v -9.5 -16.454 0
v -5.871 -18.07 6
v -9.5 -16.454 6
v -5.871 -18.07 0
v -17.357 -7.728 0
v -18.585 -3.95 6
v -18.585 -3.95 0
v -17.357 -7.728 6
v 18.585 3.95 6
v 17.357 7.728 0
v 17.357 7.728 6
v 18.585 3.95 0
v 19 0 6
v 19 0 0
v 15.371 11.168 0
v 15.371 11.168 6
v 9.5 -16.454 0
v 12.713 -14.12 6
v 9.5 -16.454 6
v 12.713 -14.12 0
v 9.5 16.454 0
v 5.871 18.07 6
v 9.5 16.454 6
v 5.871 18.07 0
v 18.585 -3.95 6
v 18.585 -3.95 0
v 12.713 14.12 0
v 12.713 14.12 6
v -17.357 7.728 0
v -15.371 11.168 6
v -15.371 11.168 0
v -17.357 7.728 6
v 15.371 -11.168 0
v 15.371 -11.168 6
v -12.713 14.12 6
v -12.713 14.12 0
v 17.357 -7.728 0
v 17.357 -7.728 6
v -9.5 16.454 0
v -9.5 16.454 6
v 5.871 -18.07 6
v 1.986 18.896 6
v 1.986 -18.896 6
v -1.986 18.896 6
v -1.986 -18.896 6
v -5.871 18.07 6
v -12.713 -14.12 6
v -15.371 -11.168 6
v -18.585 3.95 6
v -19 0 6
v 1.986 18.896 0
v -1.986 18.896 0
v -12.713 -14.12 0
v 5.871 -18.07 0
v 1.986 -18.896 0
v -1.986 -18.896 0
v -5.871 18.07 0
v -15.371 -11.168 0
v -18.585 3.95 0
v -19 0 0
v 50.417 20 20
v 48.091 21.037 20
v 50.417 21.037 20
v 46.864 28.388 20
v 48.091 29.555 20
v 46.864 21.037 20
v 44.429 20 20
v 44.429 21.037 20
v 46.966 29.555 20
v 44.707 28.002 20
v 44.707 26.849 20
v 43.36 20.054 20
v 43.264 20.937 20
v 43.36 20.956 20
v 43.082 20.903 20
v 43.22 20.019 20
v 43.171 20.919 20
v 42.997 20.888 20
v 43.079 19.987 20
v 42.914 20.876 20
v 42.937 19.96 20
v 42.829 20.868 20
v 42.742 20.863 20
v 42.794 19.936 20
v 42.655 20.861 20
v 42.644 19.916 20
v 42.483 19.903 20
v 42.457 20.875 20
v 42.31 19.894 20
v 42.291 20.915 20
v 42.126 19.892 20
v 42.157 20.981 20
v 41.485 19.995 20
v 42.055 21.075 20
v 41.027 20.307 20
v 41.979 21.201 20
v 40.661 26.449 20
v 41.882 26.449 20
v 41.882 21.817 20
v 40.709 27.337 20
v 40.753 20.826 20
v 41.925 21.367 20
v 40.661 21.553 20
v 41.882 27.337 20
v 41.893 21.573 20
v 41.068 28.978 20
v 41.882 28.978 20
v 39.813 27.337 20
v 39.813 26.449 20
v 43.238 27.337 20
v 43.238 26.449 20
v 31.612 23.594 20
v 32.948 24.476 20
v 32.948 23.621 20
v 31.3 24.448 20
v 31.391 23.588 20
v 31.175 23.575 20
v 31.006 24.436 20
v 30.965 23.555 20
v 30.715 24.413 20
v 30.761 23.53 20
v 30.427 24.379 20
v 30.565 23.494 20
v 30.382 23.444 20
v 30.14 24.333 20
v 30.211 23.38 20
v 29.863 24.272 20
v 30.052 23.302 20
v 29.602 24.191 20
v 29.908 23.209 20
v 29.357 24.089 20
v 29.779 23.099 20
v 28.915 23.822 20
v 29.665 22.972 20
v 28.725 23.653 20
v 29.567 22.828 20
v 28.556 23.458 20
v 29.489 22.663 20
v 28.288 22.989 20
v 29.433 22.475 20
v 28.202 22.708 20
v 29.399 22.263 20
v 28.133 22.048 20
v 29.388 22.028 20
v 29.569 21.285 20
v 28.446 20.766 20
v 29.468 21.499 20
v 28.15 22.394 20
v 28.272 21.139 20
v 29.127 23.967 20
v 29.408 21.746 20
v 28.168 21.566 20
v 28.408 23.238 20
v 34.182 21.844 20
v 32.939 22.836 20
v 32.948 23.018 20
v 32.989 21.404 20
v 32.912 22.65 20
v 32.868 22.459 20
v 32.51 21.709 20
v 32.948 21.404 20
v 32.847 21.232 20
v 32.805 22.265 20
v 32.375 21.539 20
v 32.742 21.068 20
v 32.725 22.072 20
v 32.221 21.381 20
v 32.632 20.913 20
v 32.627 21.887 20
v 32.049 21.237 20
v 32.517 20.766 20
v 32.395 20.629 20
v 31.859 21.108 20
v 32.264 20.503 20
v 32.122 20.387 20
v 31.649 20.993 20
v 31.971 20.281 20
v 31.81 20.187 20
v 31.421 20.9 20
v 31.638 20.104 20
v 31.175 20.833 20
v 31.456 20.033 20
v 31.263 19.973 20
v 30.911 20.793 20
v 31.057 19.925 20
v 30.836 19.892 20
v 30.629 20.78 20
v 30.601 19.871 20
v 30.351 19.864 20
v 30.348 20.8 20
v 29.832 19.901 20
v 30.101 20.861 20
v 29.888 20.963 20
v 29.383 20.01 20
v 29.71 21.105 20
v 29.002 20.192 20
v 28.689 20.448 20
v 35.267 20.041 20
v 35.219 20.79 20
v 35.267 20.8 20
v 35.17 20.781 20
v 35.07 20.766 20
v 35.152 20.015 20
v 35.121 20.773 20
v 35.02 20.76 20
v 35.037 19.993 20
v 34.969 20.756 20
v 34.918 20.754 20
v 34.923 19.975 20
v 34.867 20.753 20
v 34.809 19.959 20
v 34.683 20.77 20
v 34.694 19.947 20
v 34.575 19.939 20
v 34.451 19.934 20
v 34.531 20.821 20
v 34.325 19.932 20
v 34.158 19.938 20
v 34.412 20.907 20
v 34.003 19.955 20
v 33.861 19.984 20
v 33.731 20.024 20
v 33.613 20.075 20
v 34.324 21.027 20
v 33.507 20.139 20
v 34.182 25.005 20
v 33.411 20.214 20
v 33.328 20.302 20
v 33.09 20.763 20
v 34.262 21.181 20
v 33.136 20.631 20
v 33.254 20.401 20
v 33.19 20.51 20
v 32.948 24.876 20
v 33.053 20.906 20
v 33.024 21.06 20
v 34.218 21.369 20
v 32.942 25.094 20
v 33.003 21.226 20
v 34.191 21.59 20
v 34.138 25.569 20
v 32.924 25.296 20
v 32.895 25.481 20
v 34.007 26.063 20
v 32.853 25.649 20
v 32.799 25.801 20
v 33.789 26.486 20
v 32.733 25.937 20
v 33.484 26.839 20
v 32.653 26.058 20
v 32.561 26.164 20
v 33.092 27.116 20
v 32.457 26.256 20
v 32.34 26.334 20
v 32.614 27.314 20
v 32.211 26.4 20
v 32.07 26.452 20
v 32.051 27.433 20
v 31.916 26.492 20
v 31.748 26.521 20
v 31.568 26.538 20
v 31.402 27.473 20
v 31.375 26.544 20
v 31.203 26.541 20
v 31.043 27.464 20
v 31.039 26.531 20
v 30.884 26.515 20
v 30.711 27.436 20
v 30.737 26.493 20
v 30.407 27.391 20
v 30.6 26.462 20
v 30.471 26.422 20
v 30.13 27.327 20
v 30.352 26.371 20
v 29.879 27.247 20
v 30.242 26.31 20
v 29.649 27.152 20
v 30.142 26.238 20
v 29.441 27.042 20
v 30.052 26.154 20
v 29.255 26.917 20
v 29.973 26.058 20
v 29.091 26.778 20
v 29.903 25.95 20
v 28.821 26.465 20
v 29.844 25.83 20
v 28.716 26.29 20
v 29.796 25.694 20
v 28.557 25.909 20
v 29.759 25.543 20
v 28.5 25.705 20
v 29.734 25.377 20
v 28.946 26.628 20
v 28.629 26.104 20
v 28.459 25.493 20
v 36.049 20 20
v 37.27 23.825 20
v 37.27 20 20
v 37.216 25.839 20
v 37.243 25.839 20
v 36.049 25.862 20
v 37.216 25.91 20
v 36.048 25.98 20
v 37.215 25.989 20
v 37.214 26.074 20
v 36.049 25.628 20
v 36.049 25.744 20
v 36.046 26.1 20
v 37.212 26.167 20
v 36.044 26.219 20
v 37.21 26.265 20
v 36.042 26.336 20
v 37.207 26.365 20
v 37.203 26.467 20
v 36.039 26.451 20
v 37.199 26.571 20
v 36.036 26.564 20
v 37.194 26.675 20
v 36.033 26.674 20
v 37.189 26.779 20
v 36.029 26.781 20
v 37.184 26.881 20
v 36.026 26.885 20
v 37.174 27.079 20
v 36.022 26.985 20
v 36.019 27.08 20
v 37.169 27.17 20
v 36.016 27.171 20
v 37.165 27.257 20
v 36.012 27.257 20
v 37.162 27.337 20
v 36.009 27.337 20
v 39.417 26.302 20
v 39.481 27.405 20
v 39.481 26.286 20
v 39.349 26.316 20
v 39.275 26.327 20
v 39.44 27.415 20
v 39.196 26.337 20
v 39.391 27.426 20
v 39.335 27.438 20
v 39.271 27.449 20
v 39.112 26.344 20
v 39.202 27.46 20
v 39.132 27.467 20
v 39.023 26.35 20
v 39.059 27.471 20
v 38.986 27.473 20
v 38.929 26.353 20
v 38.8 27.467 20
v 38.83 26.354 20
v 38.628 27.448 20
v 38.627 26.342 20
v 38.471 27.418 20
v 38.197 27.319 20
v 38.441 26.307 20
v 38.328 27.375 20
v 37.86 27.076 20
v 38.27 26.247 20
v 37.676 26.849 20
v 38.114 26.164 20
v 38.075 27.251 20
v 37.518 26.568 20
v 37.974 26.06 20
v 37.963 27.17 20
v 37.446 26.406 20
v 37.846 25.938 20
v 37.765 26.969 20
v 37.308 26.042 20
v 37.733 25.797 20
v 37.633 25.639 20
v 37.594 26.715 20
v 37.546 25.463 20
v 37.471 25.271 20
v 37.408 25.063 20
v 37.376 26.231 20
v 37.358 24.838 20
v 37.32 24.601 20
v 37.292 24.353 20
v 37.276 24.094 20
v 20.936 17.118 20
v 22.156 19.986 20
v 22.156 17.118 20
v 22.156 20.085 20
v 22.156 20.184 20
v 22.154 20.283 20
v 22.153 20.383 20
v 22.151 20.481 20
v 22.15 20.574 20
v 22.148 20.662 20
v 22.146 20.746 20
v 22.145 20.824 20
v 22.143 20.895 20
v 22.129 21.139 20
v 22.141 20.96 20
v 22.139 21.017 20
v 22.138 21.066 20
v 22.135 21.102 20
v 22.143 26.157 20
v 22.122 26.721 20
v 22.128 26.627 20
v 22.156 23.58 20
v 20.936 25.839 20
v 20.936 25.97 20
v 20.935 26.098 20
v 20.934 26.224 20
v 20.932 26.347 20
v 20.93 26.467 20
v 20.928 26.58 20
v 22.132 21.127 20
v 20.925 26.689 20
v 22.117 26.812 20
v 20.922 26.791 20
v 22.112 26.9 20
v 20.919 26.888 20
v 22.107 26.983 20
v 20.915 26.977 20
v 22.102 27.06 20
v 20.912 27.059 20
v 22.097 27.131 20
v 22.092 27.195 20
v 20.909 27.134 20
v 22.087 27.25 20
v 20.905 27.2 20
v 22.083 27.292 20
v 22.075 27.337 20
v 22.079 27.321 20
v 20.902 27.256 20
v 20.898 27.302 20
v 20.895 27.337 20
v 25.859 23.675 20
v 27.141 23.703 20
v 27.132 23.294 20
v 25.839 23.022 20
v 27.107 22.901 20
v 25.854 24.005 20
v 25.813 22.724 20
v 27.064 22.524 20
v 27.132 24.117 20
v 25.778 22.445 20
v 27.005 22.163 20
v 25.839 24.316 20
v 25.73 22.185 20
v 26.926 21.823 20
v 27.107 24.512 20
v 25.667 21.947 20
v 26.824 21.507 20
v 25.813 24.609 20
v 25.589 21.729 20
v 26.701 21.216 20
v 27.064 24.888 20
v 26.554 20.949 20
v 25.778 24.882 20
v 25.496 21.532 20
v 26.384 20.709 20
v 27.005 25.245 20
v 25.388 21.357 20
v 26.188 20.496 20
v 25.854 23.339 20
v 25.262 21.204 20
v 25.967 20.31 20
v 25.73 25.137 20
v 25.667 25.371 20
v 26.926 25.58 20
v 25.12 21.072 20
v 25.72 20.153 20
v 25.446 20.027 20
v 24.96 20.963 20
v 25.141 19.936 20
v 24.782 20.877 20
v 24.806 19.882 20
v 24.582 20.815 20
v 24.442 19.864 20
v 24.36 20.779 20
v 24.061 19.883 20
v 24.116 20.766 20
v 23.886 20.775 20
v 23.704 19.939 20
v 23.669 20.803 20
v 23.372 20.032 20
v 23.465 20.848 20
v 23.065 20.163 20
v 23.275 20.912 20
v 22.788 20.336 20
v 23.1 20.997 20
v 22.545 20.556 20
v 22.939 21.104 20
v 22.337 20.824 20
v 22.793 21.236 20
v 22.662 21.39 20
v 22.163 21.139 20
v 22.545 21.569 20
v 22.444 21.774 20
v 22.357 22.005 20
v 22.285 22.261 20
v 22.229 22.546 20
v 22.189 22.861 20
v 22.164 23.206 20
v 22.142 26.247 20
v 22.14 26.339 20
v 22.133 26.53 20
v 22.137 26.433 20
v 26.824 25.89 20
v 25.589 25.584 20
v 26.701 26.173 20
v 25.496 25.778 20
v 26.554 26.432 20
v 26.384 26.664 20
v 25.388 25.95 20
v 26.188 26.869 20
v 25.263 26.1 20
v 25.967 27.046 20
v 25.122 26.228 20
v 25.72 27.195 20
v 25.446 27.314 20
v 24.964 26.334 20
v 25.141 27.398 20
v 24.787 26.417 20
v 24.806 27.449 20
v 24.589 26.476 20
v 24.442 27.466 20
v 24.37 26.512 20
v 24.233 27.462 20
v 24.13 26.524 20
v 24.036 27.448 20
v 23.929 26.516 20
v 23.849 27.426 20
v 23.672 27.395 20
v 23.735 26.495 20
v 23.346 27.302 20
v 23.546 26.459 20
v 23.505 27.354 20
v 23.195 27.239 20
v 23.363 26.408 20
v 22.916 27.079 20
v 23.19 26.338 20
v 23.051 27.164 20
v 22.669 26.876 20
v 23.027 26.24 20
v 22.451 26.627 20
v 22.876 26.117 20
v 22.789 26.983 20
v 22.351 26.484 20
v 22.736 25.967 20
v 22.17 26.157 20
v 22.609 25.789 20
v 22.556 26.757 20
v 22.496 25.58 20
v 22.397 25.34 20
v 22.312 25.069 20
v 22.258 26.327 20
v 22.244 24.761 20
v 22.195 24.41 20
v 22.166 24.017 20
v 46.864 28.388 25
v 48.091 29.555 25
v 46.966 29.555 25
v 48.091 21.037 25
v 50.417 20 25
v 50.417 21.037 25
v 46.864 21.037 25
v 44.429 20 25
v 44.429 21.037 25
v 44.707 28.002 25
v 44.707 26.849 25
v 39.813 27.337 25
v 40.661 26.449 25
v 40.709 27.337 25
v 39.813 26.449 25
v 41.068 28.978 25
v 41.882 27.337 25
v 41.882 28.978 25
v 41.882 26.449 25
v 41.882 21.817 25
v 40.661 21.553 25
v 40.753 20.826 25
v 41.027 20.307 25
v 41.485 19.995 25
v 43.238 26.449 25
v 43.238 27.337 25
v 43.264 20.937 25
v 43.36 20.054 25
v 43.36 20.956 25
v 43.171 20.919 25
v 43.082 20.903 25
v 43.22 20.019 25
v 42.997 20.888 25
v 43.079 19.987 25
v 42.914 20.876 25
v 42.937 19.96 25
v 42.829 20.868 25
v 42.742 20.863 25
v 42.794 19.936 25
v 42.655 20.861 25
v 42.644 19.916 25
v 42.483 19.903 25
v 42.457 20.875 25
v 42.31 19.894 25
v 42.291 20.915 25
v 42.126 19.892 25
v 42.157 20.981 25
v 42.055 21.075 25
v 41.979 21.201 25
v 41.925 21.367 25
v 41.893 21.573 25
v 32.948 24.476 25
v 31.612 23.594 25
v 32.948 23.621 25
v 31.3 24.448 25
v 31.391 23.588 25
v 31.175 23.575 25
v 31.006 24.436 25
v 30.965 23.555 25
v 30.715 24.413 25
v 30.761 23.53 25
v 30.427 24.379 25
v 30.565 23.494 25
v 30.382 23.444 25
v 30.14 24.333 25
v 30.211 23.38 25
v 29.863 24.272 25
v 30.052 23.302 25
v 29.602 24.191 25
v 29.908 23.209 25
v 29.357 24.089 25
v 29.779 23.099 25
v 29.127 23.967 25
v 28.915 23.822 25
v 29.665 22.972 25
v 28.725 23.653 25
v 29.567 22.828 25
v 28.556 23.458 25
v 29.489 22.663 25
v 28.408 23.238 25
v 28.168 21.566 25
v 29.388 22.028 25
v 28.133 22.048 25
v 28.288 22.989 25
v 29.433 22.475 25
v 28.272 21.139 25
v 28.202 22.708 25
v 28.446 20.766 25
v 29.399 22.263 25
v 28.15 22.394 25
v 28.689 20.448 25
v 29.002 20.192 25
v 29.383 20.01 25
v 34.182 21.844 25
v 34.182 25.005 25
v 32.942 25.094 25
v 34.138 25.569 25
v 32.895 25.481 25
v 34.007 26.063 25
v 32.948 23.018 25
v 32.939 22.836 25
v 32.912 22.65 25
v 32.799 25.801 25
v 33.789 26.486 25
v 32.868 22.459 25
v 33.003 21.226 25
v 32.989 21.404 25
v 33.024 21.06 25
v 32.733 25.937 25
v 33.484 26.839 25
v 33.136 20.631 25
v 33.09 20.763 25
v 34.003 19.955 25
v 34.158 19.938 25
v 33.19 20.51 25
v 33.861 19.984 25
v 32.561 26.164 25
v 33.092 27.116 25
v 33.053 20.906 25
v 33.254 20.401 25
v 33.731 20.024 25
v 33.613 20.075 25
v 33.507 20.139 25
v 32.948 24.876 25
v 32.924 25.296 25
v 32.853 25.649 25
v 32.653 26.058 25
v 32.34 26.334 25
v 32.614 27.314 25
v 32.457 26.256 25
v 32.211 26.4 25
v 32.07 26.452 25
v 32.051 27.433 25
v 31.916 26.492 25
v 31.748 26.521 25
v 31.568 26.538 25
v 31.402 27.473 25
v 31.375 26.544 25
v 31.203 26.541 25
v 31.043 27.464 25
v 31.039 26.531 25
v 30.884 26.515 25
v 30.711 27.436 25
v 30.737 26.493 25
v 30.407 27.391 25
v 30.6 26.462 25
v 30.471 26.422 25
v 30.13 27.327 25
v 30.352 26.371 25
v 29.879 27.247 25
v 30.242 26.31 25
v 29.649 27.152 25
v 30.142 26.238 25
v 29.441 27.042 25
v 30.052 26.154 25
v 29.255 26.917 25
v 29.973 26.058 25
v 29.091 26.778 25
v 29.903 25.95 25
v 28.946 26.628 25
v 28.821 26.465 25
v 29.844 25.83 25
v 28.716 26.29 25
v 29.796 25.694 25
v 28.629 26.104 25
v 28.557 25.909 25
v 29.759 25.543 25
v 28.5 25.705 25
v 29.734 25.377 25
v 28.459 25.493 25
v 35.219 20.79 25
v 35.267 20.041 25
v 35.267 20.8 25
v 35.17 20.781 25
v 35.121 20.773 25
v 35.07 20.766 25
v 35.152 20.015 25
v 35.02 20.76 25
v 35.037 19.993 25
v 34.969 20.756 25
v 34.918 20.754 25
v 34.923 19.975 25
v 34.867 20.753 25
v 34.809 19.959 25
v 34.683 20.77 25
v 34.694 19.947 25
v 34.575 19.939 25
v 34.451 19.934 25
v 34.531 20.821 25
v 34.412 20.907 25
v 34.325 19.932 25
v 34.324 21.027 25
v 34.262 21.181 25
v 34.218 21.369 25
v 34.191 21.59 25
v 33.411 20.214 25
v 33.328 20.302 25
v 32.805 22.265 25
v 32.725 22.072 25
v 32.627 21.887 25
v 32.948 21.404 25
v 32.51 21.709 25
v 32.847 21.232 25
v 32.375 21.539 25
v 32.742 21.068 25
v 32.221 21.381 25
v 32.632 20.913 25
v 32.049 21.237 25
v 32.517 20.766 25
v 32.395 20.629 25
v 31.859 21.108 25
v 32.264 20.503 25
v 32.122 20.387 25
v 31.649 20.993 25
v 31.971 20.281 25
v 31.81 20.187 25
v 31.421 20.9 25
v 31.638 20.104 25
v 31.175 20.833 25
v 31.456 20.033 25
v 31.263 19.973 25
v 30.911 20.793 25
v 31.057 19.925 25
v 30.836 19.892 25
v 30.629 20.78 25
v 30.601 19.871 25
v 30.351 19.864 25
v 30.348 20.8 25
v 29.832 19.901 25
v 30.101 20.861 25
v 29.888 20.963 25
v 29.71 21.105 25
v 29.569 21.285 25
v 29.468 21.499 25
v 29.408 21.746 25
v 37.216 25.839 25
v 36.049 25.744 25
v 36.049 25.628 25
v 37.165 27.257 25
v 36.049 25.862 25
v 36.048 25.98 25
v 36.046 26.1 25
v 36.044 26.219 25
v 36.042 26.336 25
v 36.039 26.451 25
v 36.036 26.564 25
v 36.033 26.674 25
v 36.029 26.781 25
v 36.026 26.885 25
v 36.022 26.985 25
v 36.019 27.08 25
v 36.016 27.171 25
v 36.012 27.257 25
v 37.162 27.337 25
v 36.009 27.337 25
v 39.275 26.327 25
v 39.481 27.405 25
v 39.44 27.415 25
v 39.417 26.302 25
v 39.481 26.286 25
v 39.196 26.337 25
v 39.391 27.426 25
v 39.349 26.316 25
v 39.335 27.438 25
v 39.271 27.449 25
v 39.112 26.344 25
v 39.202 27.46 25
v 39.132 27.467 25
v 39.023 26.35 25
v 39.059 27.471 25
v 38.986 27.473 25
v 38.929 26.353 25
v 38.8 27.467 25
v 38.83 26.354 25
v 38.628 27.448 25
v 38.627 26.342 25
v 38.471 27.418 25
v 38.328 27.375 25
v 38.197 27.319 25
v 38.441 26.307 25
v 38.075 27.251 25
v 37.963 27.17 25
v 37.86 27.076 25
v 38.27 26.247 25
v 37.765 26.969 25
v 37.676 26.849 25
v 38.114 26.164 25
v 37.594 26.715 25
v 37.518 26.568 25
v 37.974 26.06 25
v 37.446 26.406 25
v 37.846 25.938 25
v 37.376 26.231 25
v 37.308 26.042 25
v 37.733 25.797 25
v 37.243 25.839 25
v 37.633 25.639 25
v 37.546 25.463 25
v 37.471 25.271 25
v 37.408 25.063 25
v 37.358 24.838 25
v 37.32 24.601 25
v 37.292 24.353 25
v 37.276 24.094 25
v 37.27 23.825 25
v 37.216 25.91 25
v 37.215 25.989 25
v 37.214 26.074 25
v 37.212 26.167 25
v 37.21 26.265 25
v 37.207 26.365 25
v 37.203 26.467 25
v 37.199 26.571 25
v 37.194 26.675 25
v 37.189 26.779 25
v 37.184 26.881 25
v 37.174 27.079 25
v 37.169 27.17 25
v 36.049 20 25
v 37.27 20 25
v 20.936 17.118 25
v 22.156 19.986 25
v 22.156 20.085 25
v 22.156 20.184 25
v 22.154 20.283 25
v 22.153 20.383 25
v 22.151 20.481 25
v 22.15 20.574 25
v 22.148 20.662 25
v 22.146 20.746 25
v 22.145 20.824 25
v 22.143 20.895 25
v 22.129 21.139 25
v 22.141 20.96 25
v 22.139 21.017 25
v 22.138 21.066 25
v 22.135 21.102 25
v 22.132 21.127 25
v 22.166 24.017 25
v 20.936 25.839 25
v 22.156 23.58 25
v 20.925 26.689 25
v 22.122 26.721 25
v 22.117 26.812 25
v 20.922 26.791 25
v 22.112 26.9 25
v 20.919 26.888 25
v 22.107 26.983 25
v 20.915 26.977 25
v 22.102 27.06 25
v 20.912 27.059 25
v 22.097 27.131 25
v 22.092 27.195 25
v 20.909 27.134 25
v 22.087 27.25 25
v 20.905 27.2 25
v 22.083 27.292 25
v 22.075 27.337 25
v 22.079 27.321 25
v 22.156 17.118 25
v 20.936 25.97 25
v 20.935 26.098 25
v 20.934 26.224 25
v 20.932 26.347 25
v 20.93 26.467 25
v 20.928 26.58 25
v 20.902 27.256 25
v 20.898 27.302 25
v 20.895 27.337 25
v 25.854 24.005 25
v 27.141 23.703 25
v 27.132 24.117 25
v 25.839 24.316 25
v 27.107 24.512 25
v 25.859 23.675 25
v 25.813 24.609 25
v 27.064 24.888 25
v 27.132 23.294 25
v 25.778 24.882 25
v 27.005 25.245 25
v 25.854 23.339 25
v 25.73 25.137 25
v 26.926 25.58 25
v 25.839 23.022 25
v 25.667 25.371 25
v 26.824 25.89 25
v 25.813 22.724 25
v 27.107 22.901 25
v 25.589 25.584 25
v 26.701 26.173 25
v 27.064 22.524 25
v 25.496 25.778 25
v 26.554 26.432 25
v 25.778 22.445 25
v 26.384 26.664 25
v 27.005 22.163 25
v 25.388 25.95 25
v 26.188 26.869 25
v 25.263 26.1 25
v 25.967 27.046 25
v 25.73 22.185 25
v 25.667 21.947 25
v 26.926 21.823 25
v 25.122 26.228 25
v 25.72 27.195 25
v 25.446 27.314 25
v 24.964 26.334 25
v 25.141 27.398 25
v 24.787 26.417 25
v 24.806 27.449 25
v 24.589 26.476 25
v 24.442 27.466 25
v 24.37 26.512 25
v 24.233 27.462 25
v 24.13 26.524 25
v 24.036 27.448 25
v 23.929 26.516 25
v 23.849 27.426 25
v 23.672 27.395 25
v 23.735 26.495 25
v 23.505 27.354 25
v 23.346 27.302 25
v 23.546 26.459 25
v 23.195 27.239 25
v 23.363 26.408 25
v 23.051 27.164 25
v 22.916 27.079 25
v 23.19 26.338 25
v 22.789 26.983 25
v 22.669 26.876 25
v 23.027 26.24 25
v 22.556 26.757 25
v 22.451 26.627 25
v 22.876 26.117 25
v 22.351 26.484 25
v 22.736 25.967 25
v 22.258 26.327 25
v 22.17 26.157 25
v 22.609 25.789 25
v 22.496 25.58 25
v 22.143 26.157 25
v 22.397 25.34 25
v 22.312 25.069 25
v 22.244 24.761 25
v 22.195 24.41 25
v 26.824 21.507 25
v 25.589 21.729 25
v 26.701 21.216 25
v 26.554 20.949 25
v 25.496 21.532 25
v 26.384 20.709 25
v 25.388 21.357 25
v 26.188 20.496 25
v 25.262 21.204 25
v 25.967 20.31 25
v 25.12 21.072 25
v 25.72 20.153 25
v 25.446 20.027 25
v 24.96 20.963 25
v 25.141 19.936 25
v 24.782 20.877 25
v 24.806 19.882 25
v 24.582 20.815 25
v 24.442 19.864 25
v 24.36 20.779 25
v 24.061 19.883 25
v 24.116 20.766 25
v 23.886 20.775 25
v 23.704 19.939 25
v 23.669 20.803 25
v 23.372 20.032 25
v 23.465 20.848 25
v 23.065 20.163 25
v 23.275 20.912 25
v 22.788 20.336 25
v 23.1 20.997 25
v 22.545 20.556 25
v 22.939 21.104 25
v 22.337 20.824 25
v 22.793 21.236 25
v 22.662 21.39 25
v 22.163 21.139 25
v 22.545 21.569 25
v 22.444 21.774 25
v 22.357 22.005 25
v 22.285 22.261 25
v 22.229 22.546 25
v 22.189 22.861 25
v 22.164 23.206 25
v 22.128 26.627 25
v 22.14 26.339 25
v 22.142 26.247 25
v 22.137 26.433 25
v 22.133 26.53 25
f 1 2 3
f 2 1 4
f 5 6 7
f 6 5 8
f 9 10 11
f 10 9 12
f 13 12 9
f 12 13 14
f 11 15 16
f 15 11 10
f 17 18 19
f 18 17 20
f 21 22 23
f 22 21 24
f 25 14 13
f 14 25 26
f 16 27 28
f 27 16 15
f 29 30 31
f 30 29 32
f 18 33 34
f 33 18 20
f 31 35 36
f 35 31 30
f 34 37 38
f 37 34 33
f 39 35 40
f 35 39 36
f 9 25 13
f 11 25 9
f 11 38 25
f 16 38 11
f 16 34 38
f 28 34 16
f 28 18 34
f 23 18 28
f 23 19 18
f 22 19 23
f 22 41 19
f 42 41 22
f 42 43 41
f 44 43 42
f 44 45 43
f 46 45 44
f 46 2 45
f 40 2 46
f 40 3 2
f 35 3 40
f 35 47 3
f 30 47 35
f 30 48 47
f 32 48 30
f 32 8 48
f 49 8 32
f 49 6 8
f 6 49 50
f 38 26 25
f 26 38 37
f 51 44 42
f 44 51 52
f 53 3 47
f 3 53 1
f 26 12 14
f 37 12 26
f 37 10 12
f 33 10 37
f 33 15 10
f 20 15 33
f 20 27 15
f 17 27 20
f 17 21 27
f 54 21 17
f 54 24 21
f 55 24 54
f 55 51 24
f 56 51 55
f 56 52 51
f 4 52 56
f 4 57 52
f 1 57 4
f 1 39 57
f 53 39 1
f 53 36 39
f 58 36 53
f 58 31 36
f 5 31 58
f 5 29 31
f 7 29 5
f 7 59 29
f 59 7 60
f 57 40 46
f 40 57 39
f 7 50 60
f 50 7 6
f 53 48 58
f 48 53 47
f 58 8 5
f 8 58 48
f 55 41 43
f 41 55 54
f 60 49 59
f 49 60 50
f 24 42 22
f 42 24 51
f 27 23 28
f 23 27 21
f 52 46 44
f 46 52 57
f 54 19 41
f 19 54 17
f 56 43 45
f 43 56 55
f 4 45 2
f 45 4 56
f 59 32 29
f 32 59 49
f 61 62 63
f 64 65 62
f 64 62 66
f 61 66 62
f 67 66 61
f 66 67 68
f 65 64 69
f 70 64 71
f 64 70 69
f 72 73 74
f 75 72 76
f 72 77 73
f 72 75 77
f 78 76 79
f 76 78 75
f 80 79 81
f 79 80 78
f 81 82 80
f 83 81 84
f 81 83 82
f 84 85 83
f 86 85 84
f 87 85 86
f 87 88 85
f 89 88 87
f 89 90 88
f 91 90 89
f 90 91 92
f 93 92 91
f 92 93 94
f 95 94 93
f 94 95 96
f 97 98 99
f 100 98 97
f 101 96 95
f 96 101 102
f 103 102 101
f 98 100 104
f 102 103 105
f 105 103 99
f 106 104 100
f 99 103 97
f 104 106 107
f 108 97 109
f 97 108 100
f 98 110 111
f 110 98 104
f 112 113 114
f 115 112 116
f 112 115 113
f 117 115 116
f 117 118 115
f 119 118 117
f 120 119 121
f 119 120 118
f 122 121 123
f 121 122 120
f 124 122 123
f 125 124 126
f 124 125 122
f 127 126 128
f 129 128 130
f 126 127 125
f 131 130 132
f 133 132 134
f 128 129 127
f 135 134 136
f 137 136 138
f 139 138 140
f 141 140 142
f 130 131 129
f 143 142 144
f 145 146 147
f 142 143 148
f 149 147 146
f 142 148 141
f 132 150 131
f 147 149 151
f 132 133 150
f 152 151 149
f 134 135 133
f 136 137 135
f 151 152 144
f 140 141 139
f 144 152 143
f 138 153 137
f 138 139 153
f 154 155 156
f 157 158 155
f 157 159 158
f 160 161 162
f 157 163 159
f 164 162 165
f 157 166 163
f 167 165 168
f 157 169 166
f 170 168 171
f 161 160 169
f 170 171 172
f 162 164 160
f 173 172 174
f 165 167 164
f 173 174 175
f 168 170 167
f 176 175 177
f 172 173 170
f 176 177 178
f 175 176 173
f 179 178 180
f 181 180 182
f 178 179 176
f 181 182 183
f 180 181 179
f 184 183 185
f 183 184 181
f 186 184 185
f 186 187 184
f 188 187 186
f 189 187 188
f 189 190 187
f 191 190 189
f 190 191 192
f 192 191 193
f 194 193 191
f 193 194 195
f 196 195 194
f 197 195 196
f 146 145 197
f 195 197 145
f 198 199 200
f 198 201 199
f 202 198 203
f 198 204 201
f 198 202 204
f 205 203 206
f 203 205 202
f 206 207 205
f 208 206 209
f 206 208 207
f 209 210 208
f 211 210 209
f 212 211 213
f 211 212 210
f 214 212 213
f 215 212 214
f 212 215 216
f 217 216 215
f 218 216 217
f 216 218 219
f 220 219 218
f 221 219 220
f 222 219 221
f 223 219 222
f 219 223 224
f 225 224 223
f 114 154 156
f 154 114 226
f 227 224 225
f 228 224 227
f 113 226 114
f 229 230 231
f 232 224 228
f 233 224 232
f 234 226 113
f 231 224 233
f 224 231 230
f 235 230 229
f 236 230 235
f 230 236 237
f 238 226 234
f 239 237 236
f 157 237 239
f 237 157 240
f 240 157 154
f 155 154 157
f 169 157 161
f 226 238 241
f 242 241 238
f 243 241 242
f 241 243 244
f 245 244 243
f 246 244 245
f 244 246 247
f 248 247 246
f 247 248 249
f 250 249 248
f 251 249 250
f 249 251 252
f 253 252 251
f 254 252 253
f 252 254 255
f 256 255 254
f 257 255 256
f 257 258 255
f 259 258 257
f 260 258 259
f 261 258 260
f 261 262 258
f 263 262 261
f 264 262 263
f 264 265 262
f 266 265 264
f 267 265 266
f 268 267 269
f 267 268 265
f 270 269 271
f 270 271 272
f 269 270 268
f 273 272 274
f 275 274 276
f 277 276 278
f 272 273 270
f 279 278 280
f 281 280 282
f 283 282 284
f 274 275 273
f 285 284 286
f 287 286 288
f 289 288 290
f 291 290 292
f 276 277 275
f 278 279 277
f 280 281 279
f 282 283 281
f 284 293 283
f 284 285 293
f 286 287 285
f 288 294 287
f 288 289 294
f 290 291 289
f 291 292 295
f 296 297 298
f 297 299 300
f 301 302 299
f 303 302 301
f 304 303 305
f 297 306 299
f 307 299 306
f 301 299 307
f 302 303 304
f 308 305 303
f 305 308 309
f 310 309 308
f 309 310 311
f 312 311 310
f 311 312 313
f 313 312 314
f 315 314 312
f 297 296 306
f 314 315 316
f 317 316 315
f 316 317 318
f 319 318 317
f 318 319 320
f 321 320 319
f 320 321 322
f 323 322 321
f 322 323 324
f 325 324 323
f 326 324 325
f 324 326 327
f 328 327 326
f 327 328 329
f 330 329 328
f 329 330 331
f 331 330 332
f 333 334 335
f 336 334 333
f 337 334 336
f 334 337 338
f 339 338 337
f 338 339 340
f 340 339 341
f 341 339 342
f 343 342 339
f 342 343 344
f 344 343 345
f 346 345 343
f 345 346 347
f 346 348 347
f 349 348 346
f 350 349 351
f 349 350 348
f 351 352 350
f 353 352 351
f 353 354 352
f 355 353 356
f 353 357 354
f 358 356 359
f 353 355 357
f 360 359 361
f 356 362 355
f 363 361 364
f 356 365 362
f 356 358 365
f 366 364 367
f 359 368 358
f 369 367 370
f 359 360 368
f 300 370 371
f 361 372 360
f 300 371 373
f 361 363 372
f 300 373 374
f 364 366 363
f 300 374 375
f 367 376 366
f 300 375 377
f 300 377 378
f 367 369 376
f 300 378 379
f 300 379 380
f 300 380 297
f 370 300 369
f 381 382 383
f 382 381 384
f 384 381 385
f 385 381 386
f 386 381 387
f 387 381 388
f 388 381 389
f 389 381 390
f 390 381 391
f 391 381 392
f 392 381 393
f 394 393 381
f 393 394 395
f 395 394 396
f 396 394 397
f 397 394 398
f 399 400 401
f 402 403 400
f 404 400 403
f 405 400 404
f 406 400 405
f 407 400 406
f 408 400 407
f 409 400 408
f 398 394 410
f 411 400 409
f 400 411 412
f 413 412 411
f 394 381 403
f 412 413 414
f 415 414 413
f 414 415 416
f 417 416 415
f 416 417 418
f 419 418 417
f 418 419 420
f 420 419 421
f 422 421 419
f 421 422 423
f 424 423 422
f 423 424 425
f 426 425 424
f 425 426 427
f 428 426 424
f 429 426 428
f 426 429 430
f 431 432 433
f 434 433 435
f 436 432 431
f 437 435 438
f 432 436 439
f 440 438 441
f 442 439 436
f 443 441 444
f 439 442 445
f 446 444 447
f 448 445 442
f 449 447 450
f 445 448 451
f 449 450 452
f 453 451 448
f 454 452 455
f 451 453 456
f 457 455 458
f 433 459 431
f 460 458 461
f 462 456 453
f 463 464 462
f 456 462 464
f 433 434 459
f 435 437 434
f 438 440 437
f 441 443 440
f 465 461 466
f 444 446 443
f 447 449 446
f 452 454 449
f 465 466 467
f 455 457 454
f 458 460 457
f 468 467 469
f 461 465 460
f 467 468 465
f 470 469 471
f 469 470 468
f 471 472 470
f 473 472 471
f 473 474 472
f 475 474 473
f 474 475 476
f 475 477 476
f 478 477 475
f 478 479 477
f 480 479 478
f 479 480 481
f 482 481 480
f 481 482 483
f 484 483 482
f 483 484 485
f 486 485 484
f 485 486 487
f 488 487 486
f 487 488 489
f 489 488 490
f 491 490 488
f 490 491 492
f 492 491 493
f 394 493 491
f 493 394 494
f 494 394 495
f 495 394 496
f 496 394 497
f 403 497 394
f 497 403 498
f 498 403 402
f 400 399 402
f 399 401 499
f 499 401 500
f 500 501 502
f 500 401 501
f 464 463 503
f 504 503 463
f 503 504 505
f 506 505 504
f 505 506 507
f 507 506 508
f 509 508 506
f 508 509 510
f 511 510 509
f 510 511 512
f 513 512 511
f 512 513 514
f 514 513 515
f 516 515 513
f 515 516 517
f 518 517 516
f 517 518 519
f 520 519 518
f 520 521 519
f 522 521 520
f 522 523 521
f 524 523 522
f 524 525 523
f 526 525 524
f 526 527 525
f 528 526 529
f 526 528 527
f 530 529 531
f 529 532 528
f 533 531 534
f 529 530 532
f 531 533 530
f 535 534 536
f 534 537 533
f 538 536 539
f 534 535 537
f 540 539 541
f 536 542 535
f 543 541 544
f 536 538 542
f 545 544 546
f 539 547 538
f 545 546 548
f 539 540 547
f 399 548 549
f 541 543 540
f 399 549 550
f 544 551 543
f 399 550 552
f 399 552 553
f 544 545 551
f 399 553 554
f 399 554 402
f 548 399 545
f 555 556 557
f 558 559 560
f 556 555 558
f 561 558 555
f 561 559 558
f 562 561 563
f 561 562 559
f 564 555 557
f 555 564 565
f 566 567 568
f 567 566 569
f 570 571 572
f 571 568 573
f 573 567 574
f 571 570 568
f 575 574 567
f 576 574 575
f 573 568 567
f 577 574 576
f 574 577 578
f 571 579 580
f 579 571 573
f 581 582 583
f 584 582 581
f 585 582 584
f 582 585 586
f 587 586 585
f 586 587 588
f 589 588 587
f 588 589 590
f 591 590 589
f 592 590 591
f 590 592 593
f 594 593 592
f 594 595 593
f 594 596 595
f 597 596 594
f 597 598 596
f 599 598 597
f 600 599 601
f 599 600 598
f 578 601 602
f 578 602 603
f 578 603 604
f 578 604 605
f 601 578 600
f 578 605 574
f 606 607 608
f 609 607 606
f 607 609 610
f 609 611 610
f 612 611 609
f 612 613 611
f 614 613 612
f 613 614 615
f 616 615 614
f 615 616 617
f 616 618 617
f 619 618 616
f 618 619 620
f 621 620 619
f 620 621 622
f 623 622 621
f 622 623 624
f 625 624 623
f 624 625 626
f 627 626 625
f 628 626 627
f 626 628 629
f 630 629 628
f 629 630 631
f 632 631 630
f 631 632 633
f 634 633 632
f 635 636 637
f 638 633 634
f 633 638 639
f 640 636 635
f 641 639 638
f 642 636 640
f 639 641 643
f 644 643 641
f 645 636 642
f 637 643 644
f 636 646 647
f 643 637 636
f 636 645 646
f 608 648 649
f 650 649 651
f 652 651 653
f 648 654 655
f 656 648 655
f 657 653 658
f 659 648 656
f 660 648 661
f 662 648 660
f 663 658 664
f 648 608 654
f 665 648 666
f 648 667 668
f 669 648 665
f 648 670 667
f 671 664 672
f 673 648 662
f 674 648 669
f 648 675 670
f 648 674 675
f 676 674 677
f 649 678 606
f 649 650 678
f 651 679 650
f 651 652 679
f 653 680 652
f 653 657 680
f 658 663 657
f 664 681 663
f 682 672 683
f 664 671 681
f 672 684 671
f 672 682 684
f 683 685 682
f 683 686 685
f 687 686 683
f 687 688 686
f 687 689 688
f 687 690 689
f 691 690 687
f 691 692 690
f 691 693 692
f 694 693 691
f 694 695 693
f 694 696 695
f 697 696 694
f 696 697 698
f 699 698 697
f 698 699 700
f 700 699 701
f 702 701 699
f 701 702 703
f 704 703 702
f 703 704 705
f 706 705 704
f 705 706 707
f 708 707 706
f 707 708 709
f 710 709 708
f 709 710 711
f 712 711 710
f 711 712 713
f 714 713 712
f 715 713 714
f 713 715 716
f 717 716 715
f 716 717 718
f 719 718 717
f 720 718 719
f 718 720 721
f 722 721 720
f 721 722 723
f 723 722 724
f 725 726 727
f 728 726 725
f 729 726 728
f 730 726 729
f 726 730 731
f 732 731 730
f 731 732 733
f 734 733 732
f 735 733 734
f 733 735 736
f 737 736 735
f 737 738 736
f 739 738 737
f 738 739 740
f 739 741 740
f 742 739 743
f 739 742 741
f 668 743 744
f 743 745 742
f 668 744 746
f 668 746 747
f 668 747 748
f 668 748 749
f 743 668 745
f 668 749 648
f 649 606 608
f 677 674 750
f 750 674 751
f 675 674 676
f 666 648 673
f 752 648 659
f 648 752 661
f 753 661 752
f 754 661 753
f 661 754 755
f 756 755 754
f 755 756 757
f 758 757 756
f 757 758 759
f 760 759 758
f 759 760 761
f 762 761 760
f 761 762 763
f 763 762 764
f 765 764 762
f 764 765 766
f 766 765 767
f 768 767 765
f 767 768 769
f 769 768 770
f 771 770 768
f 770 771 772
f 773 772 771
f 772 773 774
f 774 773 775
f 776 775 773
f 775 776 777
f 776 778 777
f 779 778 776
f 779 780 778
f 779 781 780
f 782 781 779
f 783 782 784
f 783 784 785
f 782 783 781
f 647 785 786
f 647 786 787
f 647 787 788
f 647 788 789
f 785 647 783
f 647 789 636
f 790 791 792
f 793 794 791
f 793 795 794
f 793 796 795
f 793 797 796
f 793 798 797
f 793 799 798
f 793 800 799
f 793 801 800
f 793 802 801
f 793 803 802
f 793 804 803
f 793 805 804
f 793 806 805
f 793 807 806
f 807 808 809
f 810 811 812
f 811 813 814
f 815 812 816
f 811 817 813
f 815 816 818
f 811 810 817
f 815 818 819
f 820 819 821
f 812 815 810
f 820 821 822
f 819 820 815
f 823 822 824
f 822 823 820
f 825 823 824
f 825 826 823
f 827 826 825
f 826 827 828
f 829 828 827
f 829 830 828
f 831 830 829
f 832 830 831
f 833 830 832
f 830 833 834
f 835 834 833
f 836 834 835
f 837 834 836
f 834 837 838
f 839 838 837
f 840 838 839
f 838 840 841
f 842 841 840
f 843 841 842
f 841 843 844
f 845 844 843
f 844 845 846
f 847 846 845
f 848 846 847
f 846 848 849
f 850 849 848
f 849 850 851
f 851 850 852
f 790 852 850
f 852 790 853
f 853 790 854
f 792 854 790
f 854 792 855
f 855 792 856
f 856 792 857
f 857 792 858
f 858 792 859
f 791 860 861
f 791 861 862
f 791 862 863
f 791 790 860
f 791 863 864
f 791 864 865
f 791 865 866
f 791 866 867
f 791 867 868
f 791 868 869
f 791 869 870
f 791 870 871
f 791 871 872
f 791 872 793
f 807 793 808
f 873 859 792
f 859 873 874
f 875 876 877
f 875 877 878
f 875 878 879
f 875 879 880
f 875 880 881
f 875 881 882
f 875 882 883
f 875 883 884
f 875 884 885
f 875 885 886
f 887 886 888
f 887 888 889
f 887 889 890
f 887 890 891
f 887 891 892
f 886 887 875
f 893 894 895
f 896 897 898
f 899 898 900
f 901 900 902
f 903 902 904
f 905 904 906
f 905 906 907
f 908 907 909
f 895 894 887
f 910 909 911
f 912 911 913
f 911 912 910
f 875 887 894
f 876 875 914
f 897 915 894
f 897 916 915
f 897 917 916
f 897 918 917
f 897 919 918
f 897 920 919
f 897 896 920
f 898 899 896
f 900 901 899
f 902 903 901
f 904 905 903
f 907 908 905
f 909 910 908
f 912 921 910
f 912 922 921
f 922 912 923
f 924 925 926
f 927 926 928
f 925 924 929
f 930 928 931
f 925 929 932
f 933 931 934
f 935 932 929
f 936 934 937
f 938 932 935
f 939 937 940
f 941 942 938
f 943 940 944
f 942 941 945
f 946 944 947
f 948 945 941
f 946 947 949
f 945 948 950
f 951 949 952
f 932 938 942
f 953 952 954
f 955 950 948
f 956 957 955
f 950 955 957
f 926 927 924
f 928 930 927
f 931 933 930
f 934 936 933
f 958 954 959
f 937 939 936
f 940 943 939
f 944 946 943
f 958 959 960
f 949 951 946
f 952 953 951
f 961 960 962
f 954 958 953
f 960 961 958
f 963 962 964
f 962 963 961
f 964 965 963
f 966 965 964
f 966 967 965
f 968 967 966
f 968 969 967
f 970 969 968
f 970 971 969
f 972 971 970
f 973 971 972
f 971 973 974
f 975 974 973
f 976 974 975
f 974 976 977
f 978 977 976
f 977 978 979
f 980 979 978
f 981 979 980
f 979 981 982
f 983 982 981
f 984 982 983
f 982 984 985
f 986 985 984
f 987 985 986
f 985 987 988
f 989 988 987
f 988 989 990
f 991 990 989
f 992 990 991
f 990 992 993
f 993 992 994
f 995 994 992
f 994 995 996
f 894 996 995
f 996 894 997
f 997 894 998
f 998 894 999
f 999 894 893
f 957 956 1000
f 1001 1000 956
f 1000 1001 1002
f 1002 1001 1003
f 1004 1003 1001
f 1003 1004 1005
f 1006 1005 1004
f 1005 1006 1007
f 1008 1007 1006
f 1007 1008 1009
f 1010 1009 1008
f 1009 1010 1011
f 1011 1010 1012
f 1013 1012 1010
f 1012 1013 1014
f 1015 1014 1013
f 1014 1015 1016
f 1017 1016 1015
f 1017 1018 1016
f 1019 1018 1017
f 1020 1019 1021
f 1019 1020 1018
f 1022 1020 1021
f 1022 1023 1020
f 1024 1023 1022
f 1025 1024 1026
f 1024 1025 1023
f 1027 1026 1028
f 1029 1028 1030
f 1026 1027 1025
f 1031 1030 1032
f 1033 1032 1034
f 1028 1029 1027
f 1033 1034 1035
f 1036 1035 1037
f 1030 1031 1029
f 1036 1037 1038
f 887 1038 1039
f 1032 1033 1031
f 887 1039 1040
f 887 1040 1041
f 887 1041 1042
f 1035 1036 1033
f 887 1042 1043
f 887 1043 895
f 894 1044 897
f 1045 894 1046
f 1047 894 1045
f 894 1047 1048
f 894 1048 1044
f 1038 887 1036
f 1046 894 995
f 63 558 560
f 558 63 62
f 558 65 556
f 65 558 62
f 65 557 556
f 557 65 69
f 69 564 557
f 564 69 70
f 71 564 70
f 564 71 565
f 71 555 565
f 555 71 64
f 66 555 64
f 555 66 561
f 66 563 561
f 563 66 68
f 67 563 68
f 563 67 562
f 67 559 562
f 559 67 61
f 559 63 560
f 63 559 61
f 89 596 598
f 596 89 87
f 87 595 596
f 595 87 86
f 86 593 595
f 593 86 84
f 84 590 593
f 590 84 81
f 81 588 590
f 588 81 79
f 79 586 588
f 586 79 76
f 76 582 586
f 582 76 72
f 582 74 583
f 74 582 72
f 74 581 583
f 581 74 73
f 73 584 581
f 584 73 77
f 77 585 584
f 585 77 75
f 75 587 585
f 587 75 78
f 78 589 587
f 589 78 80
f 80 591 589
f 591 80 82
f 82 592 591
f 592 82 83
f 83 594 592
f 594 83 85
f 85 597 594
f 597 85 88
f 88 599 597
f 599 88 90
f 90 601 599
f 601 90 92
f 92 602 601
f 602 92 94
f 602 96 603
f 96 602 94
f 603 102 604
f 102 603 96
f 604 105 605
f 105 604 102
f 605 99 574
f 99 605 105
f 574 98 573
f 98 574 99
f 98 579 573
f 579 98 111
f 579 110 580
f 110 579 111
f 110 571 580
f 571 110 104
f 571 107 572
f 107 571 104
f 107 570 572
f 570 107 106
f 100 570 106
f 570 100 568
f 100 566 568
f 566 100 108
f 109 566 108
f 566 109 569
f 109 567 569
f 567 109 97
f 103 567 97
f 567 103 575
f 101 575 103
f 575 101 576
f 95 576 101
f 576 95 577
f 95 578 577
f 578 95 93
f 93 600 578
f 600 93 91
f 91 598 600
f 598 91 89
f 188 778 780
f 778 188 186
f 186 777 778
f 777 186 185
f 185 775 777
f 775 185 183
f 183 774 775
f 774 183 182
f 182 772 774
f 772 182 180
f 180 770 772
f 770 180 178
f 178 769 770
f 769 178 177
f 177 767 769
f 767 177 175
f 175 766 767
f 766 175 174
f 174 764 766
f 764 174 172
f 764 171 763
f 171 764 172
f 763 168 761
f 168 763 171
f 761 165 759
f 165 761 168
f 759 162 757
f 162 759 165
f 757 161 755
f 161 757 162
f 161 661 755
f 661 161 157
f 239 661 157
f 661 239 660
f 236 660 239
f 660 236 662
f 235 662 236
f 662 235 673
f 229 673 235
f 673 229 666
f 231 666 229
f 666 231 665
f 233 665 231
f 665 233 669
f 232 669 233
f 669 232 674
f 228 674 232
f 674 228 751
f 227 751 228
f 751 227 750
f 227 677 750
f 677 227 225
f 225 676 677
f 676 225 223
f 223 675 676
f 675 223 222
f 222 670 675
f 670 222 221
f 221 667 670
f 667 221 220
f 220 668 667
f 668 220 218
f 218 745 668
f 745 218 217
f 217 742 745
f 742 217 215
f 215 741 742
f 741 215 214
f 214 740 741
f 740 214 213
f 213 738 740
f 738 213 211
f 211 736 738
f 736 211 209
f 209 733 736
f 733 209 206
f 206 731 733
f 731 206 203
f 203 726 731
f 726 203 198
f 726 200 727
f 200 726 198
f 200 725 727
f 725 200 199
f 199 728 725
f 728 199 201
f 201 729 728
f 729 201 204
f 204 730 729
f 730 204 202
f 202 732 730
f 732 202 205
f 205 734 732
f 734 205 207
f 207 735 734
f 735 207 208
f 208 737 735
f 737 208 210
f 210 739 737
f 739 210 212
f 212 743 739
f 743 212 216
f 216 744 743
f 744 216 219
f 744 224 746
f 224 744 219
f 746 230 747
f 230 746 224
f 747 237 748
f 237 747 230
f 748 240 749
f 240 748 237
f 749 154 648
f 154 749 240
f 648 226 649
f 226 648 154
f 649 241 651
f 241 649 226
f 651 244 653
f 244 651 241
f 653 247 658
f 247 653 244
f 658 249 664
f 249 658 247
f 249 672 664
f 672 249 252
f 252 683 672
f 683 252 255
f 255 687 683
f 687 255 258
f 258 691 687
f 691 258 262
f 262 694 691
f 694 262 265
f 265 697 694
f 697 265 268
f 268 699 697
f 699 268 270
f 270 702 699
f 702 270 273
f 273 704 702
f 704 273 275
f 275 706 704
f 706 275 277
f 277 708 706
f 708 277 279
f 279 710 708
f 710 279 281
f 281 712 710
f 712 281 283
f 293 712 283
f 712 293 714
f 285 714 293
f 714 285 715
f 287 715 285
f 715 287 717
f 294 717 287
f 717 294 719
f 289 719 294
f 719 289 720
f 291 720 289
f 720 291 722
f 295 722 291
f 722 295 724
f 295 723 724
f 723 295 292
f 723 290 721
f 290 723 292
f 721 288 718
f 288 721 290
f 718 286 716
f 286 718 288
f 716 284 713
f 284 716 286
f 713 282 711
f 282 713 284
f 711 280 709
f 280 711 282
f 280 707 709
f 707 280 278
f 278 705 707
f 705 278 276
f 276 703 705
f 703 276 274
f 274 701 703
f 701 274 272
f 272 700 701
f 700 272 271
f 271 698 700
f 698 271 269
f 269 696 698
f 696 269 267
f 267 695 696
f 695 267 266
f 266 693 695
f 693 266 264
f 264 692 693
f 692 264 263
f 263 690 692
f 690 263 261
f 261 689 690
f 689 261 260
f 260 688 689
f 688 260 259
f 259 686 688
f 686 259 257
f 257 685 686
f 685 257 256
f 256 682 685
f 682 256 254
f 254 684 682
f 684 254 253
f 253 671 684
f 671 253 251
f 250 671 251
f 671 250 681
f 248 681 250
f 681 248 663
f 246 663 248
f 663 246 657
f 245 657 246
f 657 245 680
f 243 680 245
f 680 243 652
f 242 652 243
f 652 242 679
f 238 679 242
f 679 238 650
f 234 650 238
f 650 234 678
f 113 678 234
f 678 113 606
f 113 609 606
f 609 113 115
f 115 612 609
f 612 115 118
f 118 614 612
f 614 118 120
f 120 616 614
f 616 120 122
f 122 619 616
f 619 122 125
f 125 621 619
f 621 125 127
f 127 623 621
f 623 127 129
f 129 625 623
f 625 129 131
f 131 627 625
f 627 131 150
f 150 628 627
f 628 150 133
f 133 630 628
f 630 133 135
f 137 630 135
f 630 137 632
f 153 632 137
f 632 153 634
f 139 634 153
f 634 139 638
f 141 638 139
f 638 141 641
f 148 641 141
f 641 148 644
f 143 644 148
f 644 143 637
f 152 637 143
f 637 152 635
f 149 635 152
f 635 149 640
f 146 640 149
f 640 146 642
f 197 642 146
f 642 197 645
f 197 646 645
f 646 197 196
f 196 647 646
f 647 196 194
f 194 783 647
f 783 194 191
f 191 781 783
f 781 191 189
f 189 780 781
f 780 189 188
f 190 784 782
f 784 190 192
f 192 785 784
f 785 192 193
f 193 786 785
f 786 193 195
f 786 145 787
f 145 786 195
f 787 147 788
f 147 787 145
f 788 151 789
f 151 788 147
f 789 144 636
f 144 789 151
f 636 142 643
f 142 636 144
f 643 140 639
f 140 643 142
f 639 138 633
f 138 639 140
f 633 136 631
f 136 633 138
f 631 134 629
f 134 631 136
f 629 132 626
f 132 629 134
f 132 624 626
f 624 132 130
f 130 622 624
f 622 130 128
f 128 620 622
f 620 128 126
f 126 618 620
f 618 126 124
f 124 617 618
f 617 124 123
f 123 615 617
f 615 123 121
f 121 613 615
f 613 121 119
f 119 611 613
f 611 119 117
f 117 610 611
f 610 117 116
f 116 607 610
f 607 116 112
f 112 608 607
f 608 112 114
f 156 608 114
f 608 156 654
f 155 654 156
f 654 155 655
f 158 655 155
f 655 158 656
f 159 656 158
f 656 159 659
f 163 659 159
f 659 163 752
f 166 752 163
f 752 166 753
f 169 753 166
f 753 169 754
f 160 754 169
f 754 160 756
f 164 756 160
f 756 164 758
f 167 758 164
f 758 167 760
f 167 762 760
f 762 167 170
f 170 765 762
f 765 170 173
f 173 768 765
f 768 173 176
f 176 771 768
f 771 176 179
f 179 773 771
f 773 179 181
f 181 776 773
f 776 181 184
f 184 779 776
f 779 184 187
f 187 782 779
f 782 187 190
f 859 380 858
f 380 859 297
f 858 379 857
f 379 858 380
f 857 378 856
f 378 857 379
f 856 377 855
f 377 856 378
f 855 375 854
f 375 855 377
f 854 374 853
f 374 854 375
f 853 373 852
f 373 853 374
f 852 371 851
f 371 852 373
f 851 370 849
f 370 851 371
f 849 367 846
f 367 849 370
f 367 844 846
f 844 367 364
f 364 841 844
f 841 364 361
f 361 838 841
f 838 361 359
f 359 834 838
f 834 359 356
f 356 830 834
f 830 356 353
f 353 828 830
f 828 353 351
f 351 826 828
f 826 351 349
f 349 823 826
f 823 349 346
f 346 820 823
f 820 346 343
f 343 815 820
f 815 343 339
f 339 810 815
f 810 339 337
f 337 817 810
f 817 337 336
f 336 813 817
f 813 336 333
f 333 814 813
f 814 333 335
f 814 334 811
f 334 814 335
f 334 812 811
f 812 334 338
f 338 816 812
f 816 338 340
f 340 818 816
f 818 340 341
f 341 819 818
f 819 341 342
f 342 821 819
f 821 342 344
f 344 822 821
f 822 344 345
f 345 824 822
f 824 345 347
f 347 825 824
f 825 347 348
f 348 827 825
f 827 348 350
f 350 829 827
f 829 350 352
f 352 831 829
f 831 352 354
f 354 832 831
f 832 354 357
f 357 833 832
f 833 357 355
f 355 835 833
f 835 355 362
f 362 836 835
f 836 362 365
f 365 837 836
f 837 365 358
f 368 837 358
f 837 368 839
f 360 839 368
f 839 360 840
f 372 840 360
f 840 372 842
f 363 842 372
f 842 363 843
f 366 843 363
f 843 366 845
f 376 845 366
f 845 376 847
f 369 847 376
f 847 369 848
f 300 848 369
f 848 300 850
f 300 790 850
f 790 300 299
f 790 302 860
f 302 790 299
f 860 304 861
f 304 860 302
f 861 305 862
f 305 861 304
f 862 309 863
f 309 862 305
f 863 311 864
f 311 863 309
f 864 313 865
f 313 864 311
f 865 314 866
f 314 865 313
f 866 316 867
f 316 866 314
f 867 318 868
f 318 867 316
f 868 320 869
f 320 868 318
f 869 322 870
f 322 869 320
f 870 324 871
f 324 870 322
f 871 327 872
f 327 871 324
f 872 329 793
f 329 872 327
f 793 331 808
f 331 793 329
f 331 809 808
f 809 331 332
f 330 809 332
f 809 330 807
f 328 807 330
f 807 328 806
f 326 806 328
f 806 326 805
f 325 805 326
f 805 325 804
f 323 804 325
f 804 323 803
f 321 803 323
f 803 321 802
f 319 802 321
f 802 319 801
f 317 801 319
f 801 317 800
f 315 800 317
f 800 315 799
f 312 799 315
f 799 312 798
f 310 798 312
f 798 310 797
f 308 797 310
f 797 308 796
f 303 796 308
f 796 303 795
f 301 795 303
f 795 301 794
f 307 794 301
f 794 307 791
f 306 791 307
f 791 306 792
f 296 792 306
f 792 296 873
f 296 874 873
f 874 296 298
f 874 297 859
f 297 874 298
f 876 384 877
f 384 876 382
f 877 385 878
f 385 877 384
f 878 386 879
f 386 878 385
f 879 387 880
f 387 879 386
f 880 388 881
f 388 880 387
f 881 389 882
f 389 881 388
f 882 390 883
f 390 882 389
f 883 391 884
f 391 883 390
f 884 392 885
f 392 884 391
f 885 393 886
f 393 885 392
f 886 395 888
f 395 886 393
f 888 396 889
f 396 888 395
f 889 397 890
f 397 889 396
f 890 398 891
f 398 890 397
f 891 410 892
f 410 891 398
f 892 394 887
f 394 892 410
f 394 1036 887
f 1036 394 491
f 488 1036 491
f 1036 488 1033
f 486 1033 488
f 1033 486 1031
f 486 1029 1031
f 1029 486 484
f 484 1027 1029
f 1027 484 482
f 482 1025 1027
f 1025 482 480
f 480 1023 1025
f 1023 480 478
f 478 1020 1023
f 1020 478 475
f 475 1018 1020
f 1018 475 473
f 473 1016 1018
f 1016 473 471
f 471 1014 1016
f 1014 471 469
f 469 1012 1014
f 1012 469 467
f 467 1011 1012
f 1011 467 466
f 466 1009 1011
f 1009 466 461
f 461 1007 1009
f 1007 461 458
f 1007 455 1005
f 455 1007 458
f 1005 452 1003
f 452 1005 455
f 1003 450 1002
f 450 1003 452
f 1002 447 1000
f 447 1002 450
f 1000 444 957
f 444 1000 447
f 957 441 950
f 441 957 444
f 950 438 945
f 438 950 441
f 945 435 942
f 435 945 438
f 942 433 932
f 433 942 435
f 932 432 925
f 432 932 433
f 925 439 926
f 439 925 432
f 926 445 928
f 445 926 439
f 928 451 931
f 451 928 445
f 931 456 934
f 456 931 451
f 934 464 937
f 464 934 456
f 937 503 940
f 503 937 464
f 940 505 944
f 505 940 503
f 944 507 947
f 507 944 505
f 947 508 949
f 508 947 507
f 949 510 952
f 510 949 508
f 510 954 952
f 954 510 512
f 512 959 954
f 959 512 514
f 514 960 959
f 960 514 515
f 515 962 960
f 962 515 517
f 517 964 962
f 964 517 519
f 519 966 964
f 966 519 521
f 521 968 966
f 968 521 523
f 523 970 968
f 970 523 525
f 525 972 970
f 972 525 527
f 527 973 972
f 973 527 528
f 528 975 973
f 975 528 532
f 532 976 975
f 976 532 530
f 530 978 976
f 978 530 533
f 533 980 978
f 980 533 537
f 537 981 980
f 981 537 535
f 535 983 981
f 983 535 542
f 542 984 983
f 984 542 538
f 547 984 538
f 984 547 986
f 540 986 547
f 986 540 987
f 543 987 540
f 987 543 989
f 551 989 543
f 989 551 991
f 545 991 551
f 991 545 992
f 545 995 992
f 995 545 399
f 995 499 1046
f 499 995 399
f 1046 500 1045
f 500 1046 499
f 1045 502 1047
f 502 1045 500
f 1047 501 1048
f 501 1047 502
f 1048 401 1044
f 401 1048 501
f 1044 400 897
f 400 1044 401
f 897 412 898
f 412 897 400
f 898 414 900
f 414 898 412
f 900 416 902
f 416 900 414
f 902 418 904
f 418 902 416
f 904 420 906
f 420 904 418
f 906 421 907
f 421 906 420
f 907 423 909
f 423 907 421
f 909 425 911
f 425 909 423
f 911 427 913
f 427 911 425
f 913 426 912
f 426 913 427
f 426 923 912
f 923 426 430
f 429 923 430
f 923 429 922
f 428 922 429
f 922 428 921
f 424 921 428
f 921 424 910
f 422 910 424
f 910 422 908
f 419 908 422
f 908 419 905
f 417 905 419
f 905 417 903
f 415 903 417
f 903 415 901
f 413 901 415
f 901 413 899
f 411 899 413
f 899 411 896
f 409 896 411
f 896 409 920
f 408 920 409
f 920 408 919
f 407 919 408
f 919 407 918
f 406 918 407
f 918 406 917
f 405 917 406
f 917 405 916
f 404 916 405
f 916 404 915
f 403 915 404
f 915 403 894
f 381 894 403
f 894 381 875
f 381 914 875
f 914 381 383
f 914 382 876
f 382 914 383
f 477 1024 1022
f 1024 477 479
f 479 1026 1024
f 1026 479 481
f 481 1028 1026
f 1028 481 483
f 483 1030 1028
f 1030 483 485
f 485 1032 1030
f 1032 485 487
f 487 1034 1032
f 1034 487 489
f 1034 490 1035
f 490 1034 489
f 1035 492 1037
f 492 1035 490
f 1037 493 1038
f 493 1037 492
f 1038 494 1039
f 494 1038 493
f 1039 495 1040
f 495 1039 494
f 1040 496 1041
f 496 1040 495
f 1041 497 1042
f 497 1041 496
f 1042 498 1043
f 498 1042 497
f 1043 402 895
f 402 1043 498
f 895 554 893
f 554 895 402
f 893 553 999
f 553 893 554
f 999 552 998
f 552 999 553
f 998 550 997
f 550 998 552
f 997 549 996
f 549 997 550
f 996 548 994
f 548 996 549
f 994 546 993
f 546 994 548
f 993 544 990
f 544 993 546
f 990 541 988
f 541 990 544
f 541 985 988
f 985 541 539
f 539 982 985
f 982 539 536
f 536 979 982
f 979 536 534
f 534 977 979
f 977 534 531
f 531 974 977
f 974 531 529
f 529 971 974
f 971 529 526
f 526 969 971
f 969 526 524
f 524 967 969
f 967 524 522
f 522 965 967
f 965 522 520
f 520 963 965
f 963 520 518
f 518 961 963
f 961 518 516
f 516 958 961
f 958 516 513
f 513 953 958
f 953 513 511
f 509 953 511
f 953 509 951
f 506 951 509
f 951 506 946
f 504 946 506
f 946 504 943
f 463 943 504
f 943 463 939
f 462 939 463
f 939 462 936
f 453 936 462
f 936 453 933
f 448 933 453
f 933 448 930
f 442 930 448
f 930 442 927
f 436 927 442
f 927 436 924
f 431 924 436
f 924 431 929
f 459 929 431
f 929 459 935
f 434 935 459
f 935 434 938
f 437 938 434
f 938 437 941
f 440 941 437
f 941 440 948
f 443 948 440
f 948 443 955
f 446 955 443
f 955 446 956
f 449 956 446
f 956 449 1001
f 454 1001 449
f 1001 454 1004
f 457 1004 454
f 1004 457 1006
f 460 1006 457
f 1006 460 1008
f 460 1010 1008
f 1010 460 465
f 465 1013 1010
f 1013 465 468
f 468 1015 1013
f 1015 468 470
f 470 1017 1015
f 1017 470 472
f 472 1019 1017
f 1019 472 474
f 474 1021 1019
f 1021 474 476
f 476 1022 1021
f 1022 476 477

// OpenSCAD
//[CUSTOMIZATION]
// Height
h=6;
// Radius
r1=19;
// Message
txt="part1";
module __END_CUSTOMIZATIONS () { }
cylinder(h,r1,r1);
translate([20,20,20]) { linear_extrude(5) text(txt, font="Liberation Sans"); }
